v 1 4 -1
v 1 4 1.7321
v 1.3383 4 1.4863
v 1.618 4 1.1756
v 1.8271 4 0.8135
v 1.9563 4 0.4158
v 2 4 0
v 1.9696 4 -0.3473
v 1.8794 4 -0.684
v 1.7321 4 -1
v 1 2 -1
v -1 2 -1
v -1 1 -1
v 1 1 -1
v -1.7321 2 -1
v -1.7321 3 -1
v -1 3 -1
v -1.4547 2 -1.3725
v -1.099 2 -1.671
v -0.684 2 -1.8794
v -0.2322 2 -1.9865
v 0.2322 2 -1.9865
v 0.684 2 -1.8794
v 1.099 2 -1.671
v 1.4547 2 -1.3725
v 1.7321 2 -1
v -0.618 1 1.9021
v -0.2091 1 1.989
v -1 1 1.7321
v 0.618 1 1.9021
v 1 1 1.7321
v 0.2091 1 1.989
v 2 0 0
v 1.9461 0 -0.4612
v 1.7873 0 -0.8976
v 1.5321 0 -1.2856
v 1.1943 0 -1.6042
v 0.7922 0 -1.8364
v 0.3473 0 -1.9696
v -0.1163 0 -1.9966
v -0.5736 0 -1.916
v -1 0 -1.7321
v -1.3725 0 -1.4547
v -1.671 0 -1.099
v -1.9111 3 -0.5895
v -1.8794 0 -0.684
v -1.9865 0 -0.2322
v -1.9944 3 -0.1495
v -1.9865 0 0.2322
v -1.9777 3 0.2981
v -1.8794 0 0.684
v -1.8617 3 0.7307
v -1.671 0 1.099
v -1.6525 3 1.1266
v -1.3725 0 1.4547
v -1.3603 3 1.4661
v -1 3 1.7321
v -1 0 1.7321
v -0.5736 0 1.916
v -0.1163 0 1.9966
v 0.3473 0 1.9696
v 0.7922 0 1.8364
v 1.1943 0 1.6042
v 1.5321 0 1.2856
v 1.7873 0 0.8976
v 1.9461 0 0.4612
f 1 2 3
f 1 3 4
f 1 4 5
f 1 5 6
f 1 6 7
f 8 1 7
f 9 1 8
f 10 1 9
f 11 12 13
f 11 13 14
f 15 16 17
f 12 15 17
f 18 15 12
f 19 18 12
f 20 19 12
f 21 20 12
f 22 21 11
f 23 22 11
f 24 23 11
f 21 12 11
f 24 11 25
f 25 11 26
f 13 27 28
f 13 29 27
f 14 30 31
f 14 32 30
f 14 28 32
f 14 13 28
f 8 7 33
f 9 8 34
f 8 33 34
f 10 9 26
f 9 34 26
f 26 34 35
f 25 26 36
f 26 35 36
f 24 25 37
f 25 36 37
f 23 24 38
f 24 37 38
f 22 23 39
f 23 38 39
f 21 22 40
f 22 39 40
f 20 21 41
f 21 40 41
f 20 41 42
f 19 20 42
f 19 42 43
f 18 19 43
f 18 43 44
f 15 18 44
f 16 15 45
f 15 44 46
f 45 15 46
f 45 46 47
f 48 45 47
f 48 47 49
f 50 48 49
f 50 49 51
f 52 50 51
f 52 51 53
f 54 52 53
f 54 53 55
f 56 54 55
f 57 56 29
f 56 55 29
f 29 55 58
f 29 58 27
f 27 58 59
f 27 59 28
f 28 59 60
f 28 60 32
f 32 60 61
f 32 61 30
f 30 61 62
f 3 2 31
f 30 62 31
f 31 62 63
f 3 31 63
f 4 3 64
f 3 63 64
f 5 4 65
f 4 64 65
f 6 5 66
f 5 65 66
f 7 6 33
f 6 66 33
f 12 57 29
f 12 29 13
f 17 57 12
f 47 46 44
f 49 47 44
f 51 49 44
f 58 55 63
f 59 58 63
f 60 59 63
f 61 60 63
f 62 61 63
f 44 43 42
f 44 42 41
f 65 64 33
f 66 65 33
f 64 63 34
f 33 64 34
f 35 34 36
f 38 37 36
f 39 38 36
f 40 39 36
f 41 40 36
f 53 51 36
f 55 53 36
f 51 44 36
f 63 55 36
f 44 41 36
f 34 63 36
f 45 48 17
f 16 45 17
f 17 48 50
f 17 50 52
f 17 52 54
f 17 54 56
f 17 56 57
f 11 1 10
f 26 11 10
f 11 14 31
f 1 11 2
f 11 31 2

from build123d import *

# Parameters (mm, degrees)
SKETCH1_R           = 2
BOSS_EXTRUDE1_DEPTH = 4
CUT_EXTRUDE2_DEPTH  = 2
CUT_EXTRUDE3_DEPTH  = 5.5
SKETCH5_W           = 2
SKETCH5_H           = 3.090553664
CUT_EXTRUDE4_DEPTH  = 1


with BuildPart() as part:
    # Sketch1 → Boss-Extrude1 (new body)
    with BuildSketch(Plane(origin=(0, 0, 0), x_dir=(1, 0, 0), z_dir=(0, 1, 0))):
        Circle(SKETCH1_R)
    extrude(amount=BOSS_EXTRUDE1_DEPTH)

    # Sketch3 → Cut-Extrude2 (cut)
    with BuildSketch(Plane(origin=(0, 4, 0), x_dir=(1, 0, 0), z_dir=(0, 1, 0))):
        with BuildLine():
            Line((-1.732050808, 1), (1.732050808, 1))
            ThreePointArc((1.732050808, 1), (0, 2), (-1.732050808, 1))
        make_face()
    extrude(amount=-CUT_EXTRUDE2_DEPTH, mode=Mode.SUBTRACT)

    # Sketch4 → Cut-Extrude3 (cut, symmetric)
    with BuildSketch(Plane.XY):
        Polygon((-2, 3), (-1, 3), (-1, 2), (1, 2), (1, 4), (-2, 4), align=None)
    extrude(amount=CUT_EXTRUDE3_DEPTH, both=True, mode=Mode.SUBTRACT)

    # Sketch5 → Cut-Extrude4 (cut)
    with BuildSketch(Plane(origin=(0, 2, 0), x_dir=(1, 0, 0), z_dir=(0, 1, 0))):
        with Locations((0, -0.545276832)):
            Rectangle(SKETCH5_W, SKETCH5_H)
    extrude(amount=-CUT_EXTRUDE4_DEPTH, mode=Mode.SUBTRACT)


solid = part.part
